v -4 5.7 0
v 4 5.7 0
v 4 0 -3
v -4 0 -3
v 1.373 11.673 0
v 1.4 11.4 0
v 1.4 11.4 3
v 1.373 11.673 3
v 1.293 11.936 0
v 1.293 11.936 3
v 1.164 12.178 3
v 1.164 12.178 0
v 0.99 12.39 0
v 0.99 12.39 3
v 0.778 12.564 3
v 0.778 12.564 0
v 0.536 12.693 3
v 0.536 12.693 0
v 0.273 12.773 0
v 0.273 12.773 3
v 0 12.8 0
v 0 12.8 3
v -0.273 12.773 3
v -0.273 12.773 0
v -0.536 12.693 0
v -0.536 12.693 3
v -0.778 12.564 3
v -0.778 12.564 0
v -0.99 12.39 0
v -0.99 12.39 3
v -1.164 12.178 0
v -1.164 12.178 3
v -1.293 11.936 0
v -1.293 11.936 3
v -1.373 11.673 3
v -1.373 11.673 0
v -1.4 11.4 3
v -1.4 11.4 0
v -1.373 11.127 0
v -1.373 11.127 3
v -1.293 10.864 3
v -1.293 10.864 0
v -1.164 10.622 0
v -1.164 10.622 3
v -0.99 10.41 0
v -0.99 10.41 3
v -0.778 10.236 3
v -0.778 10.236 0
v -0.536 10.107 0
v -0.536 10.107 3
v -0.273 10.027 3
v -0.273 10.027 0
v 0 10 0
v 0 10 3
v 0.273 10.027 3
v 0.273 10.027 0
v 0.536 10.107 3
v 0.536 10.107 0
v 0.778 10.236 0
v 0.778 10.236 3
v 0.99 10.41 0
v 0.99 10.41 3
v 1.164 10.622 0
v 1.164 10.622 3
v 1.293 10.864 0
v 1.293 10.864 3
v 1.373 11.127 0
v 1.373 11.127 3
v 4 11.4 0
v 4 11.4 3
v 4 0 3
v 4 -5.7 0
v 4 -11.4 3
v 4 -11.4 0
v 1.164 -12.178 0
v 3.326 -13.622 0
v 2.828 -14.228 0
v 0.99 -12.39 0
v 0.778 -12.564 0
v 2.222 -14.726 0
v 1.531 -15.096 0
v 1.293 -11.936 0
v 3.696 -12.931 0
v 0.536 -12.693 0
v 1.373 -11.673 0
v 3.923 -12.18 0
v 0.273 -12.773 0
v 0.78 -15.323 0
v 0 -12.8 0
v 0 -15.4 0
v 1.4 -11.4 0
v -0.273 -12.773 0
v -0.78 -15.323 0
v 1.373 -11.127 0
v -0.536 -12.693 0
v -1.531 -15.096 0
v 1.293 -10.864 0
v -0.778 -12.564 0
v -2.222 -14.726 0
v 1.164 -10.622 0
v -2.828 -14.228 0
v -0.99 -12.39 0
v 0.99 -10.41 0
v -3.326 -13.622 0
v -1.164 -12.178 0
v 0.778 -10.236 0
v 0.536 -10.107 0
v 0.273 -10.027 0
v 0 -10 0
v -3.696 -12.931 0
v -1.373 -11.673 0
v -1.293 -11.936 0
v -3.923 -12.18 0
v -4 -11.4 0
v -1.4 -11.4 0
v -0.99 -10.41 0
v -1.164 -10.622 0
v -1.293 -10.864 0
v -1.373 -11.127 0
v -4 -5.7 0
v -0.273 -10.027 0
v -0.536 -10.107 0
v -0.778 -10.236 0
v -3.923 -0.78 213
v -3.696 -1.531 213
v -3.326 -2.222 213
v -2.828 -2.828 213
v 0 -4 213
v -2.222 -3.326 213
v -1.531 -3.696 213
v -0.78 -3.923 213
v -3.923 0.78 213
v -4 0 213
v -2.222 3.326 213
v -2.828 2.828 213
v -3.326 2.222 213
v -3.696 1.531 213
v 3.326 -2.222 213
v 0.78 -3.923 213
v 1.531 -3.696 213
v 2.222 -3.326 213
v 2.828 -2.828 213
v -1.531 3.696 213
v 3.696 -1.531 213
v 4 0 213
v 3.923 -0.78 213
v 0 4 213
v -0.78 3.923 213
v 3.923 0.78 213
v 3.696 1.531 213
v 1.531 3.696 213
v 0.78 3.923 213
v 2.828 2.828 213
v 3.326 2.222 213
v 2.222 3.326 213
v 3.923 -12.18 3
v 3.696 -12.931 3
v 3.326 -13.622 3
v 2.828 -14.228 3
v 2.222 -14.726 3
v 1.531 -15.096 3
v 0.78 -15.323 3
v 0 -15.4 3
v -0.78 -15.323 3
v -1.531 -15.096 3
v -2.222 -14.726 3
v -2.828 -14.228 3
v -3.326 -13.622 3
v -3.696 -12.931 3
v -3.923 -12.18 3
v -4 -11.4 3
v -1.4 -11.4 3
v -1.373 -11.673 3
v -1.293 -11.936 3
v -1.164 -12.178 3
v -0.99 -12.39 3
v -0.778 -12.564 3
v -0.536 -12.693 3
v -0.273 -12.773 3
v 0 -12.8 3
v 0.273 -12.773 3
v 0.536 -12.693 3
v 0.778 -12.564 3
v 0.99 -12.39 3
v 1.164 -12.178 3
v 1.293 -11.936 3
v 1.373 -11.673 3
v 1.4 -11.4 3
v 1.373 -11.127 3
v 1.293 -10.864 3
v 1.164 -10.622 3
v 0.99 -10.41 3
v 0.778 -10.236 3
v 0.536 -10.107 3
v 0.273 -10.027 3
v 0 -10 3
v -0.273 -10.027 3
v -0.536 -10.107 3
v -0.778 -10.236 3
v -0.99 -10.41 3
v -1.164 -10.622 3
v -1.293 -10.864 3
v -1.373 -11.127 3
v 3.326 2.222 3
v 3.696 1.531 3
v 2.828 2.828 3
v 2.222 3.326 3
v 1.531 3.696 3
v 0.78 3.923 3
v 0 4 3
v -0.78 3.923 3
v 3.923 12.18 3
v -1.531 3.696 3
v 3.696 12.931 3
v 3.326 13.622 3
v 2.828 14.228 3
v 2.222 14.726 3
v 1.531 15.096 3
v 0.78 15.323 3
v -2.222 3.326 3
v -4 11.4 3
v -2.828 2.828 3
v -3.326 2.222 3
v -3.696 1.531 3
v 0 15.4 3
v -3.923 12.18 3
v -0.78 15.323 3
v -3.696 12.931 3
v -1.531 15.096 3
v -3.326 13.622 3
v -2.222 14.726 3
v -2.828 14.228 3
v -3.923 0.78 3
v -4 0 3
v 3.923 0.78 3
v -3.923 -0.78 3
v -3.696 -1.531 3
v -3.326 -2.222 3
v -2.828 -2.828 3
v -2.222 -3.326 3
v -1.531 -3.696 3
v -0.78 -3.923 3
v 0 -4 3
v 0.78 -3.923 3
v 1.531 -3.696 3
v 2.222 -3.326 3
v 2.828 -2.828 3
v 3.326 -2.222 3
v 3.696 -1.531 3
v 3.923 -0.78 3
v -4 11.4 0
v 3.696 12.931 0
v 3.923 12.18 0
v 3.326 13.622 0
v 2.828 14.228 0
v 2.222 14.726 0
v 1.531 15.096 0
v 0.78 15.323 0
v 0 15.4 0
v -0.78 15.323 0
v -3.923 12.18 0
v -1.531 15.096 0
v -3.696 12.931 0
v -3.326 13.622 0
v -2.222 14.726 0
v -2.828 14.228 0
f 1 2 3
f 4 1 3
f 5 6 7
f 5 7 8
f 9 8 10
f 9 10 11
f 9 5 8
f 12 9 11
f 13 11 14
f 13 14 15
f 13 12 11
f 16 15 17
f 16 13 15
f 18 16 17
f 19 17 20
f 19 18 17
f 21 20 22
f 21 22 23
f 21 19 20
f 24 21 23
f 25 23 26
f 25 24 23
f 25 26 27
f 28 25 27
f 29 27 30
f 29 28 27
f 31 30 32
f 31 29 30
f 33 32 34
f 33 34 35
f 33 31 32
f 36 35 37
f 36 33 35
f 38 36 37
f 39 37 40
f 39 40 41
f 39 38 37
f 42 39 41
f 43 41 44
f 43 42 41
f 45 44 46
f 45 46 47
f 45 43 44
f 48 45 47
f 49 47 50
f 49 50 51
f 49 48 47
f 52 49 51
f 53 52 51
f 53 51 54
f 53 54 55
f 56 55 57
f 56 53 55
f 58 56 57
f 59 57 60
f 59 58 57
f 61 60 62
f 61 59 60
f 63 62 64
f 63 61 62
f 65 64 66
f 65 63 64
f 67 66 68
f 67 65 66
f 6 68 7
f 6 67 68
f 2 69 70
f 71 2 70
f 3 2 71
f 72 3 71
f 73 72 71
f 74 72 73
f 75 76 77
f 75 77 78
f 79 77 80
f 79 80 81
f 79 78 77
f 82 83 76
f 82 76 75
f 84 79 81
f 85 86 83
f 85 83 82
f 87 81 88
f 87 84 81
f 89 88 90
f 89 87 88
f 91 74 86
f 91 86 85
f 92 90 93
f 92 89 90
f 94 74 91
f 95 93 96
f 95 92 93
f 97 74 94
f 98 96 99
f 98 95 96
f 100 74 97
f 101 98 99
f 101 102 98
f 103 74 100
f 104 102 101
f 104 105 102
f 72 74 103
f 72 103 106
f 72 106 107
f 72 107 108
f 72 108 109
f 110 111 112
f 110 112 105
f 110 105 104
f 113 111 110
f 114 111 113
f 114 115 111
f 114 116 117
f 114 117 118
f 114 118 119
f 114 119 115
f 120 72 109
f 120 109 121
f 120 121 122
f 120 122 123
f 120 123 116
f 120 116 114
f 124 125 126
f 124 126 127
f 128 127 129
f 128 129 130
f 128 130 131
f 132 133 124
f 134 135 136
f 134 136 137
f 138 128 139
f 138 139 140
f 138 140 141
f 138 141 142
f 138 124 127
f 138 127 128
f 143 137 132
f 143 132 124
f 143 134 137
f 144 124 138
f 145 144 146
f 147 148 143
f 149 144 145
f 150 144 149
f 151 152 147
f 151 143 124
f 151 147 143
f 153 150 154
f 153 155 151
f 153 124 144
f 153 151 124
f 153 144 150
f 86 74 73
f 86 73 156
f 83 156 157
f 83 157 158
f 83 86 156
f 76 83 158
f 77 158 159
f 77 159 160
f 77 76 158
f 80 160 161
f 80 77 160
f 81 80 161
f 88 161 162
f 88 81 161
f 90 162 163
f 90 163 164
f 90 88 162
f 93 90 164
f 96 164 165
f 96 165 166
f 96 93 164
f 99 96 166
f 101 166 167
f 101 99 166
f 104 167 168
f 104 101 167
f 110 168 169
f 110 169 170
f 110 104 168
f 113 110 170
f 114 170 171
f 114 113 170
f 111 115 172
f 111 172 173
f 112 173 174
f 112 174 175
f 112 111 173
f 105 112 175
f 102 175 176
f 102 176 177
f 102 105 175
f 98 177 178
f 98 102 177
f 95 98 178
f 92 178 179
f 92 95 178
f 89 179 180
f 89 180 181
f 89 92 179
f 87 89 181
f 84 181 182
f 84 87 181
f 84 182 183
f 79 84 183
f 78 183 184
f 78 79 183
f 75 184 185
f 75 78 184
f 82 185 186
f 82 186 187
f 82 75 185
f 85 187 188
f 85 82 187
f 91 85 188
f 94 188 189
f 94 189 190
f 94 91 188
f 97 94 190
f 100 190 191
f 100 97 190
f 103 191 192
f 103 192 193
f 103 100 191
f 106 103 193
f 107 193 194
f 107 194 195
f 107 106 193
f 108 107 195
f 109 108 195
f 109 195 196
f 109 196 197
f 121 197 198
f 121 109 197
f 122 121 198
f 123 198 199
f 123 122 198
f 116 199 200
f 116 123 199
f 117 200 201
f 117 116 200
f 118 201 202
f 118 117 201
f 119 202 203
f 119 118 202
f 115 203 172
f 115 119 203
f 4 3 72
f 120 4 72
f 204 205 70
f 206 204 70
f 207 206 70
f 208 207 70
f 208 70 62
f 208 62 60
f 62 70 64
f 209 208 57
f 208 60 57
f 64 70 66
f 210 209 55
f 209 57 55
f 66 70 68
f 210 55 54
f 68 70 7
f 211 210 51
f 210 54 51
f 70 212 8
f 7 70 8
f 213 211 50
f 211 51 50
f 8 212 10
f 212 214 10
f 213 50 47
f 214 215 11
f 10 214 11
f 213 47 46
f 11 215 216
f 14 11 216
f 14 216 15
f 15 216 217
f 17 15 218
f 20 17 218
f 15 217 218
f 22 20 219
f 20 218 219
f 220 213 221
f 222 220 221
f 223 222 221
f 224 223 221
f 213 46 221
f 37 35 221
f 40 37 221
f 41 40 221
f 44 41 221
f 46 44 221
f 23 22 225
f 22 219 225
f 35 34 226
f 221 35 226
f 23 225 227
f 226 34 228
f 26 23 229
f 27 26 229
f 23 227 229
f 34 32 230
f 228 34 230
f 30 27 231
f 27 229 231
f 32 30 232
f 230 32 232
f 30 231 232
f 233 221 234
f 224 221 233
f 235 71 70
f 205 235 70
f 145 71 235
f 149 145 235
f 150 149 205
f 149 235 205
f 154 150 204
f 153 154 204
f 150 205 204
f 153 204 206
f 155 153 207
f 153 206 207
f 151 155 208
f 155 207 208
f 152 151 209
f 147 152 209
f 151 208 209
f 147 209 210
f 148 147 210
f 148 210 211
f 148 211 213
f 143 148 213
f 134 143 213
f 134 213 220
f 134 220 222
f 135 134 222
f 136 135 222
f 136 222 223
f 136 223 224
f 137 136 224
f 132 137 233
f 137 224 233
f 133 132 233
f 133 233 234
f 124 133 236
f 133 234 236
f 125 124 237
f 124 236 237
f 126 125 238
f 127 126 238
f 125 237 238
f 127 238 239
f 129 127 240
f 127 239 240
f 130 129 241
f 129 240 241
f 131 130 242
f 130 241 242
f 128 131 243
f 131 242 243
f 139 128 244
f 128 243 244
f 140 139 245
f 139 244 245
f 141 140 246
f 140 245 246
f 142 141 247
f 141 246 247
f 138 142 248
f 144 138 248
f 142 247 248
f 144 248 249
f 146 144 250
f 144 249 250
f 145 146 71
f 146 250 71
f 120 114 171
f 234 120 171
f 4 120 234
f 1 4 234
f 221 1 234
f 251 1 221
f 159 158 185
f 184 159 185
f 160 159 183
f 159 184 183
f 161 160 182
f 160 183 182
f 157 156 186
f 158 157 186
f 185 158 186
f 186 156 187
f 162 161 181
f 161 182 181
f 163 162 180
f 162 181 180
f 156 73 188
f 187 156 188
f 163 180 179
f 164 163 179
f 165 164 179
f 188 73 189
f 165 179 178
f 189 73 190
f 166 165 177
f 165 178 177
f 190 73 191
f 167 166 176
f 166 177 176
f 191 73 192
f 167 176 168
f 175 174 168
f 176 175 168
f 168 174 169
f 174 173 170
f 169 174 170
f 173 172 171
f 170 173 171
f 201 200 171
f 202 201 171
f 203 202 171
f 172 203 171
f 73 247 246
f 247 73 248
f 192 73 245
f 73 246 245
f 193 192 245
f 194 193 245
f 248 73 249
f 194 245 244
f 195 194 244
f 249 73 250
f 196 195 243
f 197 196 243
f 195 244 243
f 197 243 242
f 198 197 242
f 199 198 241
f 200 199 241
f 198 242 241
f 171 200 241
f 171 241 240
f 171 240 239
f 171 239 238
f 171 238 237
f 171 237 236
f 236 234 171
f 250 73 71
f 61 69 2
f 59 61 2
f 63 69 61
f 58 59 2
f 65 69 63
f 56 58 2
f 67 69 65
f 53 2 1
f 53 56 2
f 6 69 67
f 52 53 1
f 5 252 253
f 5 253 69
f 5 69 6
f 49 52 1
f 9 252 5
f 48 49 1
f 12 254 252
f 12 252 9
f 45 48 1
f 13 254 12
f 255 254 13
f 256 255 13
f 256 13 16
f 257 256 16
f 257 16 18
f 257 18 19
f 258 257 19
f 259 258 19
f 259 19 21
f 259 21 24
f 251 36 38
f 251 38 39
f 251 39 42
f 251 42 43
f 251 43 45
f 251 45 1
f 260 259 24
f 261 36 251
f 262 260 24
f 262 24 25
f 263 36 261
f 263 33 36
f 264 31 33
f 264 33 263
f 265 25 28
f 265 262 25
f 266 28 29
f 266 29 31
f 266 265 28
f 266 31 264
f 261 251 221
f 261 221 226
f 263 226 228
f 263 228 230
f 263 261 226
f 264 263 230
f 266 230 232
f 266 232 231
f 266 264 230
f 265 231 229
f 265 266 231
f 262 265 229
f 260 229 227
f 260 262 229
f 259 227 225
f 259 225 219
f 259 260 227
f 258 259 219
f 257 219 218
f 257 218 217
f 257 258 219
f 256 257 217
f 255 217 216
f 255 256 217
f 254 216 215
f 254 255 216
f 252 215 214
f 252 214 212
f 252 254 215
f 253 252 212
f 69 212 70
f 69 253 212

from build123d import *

# Parameters (mm, degrees)
SKETCH_1_R          = 1.4
EXTRUDE_1_DEPTH     = 3
SKETCH_2_R          = 4
EXTRUDE_3_DEPTH     = 210
SKETCH_3_W          = 8
SKETCH_3_H          = 5.7
EXTRUDE_4_DEPTH     = 3
CUT_EXTRUDE_1_DEPTH = 214.705779051


with BuildPart() as part:
    # 草图1 → 凸台-拉伸1 (new body)
    with BuildSketch(Plane.XY):
        with BuildLine():
            Line((-4, -11.4), (-4, 11.4))
            ThreePointArc((-4, 11.4), (0, 15.4), (4, 11.4))
            Line((4, 11.4), (4, -11.4))
            ThreePointArc((4, -11.4), (0, -15.4), (-4, -11.4))
        make_face()
        with Locations((0, 11.4)):
            Circle(SKETCH_1_R, mode=Mode.SUBTRACT)
        with Locations(Location((0, -11.4, 0), (0, 0, 180))):
            Circle(SKETCH_1_R, mode=Mode.SUBTRACT)
    extrude(amount=EXTRUDE_1_DEPTH)

    # 草图2 → 凸台-拉伸3 (add)
    with BuildSketch(Plane.XY.offset(3)):
        Circle(SKETCH_2_R)
    extrude(amount=EXTRUDE_3_DEPTH)

    # 草图3 → 凸台-拉伸4 (add)
    with BuildSketch(Plane(origin=(0, 0, 0), x_dir=(-1, 0, 0), z_dir=(0, 0, -1))):
        with Locations((0, 2.85)):
            Rectangle(SKETCH_3_W, SKETCH_3_H)
        with Locations((0, -2.85)):
            Rectangle(SKETCH_3_W, SKETCH_3_H)
    extrude(amount=EXTRUDE_4_DEPTH)

    # 草图5 → 切除-拉伸1 (cut, through all)
    with BuildSketch(Plane(origin=(4, 0, 0), x_dir=(0, 0, -1), z_dir=(1, 0, 0))):
        Polygon((0, 5.7), (3, 0), (3, 5.7), align=None)
        Polygon((3, -5.7), (3, 0), (0, -5.7), align=None)
    extrude(amount=-CUT_EXTRUDE_1_DEPTH, mode=Mode.SUBTRACT)


solid = part.part
